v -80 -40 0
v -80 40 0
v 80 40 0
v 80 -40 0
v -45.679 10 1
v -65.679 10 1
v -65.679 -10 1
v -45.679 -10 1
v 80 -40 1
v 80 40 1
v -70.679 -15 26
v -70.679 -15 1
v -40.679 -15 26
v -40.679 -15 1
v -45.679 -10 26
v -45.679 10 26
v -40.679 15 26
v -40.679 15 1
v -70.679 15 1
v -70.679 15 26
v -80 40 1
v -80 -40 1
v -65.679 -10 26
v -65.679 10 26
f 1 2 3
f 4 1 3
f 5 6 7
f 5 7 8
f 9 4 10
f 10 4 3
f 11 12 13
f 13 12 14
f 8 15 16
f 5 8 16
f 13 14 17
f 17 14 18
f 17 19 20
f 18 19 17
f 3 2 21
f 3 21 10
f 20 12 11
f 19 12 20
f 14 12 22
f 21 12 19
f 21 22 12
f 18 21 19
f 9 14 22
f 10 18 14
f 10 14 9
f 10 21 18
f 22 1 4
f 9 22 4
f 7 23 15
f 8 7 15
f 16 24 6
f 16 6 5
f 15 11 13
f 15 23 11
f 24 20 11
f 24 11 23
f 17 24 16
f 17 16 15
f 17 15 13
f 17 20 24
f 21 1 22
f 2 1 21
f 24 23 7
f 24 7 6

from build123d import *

# Parameters (mm, degrees)
F0_W     = 160
F0_H     = 80
F1_DEPTH = 1
F2_W     = 30
F2_H     = 30
F3_DEPTH = 25
F4_W     = 20
F4_H     = 20
F5_DEPTH = 25


with BuildPart() as f1:
    # F0 (on Top) → F1 (new body)
    with BuildSketch(Plane.XY):
        Rectangle(F0_W, F0_H)
    extrude(amount=F1_DEPTH)

    # F2 (on face) → F3 (join)
    with BuildSketch(Plane.XY.offset(1)):
        with Locations((-55.679019, 0)):
            Rectangle(F2_W, F2_H)
    extrude(amount=F3_DEPTH)

    # F4 (on face) → F5 (cut)
    with BuildSketch(Plane.XY.offset(26)):
        with Locations((-55.679019, 0)):
            Rectangle(F4_W, F4_H)
    extrude(amount=-F5_DEPTH, mode=Mode.SUBTRACT)


solid = f1.part
